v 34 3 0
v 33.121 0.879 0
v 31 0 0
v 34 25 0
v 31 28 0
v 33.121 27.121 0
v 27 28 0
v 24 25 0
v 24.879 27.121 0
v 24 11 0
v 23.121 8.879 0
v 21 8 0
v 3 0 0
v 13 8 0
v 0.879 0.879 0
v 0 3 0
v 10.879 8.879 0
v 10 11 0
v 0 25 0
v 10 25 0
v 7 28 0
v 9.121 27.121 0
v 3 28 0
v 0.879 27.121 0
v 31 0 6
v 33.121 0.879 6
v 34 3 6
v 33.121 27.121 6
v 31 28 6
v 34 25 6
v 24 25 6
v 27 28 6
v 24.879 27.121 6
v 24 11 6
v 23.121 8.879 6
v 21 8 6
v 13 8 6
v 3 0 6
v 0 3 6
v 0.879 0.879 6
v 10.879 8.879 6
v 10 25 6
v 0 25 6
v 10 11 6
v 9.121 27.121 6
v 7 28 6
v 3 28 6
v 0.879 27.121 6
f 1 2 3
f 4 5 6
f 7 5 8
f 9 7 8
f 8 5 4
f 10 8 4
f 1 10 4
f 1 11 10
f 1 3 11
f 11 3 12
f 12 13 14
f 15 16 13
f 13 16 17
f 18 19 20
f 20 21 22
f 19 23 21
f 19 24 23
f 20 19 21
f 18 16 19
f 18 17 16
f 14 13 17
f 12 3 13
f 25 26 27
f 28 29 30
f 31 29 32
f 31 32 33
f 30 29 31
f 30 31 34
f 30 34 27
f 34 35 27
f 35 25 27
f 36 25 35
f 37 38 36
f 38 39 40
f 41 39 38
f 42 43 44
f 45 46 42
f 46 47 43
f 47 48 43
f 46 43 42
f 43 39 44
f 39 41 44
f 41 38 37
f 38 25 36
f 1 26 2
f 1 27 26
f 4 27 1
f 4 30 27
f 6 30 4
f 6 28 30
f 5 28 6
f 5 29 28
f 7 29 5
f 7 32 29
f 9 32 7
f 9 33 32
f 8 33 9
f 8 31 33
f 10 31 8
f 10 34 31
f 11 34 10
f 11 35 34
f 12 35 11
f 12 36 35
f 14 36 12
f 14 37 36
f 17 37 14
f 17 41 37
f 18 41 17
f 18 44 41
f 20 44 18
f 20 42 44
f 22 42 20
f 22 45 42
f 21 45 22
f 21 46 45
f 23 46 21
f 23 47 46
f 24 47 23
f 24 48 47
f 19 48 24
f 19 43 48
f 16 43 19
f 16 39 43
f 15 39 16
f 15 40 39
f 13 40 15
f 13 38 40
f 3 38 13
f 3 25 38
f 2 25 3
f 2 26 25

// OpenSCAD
$fn = 32;

// ----------------------------------------------------------------------
// Eye lug: clevis, 6 mm thick
// ----------------------------------------------------------------------

// --- parameters (mm) ---
profile_height = 6;       // extrusion height
profile_points = 24;      // points of the closed outline

profile = [[0, 3], [0.879, 0.879], [3, 0], [31, 0], [33.121, 0.879], [34, 3], [34, 25], [33.121, 27.121], [31, 28], [27, 28], [24.879, 27.121], [24, 25], [24, 11], [23.121, 8.879], [21, 8], [13, 8], [10.879, 8.879], [10, 11], [10, 25], [9.121, 27.121], [7, 28], [3, 28], [0.879, 27.121], [0, 25]];  // single closed polygon, 24 points, counter clockwise

// --- the one profile operation ---
linear_extrude(height = profile_height) polygon(points = profile);
